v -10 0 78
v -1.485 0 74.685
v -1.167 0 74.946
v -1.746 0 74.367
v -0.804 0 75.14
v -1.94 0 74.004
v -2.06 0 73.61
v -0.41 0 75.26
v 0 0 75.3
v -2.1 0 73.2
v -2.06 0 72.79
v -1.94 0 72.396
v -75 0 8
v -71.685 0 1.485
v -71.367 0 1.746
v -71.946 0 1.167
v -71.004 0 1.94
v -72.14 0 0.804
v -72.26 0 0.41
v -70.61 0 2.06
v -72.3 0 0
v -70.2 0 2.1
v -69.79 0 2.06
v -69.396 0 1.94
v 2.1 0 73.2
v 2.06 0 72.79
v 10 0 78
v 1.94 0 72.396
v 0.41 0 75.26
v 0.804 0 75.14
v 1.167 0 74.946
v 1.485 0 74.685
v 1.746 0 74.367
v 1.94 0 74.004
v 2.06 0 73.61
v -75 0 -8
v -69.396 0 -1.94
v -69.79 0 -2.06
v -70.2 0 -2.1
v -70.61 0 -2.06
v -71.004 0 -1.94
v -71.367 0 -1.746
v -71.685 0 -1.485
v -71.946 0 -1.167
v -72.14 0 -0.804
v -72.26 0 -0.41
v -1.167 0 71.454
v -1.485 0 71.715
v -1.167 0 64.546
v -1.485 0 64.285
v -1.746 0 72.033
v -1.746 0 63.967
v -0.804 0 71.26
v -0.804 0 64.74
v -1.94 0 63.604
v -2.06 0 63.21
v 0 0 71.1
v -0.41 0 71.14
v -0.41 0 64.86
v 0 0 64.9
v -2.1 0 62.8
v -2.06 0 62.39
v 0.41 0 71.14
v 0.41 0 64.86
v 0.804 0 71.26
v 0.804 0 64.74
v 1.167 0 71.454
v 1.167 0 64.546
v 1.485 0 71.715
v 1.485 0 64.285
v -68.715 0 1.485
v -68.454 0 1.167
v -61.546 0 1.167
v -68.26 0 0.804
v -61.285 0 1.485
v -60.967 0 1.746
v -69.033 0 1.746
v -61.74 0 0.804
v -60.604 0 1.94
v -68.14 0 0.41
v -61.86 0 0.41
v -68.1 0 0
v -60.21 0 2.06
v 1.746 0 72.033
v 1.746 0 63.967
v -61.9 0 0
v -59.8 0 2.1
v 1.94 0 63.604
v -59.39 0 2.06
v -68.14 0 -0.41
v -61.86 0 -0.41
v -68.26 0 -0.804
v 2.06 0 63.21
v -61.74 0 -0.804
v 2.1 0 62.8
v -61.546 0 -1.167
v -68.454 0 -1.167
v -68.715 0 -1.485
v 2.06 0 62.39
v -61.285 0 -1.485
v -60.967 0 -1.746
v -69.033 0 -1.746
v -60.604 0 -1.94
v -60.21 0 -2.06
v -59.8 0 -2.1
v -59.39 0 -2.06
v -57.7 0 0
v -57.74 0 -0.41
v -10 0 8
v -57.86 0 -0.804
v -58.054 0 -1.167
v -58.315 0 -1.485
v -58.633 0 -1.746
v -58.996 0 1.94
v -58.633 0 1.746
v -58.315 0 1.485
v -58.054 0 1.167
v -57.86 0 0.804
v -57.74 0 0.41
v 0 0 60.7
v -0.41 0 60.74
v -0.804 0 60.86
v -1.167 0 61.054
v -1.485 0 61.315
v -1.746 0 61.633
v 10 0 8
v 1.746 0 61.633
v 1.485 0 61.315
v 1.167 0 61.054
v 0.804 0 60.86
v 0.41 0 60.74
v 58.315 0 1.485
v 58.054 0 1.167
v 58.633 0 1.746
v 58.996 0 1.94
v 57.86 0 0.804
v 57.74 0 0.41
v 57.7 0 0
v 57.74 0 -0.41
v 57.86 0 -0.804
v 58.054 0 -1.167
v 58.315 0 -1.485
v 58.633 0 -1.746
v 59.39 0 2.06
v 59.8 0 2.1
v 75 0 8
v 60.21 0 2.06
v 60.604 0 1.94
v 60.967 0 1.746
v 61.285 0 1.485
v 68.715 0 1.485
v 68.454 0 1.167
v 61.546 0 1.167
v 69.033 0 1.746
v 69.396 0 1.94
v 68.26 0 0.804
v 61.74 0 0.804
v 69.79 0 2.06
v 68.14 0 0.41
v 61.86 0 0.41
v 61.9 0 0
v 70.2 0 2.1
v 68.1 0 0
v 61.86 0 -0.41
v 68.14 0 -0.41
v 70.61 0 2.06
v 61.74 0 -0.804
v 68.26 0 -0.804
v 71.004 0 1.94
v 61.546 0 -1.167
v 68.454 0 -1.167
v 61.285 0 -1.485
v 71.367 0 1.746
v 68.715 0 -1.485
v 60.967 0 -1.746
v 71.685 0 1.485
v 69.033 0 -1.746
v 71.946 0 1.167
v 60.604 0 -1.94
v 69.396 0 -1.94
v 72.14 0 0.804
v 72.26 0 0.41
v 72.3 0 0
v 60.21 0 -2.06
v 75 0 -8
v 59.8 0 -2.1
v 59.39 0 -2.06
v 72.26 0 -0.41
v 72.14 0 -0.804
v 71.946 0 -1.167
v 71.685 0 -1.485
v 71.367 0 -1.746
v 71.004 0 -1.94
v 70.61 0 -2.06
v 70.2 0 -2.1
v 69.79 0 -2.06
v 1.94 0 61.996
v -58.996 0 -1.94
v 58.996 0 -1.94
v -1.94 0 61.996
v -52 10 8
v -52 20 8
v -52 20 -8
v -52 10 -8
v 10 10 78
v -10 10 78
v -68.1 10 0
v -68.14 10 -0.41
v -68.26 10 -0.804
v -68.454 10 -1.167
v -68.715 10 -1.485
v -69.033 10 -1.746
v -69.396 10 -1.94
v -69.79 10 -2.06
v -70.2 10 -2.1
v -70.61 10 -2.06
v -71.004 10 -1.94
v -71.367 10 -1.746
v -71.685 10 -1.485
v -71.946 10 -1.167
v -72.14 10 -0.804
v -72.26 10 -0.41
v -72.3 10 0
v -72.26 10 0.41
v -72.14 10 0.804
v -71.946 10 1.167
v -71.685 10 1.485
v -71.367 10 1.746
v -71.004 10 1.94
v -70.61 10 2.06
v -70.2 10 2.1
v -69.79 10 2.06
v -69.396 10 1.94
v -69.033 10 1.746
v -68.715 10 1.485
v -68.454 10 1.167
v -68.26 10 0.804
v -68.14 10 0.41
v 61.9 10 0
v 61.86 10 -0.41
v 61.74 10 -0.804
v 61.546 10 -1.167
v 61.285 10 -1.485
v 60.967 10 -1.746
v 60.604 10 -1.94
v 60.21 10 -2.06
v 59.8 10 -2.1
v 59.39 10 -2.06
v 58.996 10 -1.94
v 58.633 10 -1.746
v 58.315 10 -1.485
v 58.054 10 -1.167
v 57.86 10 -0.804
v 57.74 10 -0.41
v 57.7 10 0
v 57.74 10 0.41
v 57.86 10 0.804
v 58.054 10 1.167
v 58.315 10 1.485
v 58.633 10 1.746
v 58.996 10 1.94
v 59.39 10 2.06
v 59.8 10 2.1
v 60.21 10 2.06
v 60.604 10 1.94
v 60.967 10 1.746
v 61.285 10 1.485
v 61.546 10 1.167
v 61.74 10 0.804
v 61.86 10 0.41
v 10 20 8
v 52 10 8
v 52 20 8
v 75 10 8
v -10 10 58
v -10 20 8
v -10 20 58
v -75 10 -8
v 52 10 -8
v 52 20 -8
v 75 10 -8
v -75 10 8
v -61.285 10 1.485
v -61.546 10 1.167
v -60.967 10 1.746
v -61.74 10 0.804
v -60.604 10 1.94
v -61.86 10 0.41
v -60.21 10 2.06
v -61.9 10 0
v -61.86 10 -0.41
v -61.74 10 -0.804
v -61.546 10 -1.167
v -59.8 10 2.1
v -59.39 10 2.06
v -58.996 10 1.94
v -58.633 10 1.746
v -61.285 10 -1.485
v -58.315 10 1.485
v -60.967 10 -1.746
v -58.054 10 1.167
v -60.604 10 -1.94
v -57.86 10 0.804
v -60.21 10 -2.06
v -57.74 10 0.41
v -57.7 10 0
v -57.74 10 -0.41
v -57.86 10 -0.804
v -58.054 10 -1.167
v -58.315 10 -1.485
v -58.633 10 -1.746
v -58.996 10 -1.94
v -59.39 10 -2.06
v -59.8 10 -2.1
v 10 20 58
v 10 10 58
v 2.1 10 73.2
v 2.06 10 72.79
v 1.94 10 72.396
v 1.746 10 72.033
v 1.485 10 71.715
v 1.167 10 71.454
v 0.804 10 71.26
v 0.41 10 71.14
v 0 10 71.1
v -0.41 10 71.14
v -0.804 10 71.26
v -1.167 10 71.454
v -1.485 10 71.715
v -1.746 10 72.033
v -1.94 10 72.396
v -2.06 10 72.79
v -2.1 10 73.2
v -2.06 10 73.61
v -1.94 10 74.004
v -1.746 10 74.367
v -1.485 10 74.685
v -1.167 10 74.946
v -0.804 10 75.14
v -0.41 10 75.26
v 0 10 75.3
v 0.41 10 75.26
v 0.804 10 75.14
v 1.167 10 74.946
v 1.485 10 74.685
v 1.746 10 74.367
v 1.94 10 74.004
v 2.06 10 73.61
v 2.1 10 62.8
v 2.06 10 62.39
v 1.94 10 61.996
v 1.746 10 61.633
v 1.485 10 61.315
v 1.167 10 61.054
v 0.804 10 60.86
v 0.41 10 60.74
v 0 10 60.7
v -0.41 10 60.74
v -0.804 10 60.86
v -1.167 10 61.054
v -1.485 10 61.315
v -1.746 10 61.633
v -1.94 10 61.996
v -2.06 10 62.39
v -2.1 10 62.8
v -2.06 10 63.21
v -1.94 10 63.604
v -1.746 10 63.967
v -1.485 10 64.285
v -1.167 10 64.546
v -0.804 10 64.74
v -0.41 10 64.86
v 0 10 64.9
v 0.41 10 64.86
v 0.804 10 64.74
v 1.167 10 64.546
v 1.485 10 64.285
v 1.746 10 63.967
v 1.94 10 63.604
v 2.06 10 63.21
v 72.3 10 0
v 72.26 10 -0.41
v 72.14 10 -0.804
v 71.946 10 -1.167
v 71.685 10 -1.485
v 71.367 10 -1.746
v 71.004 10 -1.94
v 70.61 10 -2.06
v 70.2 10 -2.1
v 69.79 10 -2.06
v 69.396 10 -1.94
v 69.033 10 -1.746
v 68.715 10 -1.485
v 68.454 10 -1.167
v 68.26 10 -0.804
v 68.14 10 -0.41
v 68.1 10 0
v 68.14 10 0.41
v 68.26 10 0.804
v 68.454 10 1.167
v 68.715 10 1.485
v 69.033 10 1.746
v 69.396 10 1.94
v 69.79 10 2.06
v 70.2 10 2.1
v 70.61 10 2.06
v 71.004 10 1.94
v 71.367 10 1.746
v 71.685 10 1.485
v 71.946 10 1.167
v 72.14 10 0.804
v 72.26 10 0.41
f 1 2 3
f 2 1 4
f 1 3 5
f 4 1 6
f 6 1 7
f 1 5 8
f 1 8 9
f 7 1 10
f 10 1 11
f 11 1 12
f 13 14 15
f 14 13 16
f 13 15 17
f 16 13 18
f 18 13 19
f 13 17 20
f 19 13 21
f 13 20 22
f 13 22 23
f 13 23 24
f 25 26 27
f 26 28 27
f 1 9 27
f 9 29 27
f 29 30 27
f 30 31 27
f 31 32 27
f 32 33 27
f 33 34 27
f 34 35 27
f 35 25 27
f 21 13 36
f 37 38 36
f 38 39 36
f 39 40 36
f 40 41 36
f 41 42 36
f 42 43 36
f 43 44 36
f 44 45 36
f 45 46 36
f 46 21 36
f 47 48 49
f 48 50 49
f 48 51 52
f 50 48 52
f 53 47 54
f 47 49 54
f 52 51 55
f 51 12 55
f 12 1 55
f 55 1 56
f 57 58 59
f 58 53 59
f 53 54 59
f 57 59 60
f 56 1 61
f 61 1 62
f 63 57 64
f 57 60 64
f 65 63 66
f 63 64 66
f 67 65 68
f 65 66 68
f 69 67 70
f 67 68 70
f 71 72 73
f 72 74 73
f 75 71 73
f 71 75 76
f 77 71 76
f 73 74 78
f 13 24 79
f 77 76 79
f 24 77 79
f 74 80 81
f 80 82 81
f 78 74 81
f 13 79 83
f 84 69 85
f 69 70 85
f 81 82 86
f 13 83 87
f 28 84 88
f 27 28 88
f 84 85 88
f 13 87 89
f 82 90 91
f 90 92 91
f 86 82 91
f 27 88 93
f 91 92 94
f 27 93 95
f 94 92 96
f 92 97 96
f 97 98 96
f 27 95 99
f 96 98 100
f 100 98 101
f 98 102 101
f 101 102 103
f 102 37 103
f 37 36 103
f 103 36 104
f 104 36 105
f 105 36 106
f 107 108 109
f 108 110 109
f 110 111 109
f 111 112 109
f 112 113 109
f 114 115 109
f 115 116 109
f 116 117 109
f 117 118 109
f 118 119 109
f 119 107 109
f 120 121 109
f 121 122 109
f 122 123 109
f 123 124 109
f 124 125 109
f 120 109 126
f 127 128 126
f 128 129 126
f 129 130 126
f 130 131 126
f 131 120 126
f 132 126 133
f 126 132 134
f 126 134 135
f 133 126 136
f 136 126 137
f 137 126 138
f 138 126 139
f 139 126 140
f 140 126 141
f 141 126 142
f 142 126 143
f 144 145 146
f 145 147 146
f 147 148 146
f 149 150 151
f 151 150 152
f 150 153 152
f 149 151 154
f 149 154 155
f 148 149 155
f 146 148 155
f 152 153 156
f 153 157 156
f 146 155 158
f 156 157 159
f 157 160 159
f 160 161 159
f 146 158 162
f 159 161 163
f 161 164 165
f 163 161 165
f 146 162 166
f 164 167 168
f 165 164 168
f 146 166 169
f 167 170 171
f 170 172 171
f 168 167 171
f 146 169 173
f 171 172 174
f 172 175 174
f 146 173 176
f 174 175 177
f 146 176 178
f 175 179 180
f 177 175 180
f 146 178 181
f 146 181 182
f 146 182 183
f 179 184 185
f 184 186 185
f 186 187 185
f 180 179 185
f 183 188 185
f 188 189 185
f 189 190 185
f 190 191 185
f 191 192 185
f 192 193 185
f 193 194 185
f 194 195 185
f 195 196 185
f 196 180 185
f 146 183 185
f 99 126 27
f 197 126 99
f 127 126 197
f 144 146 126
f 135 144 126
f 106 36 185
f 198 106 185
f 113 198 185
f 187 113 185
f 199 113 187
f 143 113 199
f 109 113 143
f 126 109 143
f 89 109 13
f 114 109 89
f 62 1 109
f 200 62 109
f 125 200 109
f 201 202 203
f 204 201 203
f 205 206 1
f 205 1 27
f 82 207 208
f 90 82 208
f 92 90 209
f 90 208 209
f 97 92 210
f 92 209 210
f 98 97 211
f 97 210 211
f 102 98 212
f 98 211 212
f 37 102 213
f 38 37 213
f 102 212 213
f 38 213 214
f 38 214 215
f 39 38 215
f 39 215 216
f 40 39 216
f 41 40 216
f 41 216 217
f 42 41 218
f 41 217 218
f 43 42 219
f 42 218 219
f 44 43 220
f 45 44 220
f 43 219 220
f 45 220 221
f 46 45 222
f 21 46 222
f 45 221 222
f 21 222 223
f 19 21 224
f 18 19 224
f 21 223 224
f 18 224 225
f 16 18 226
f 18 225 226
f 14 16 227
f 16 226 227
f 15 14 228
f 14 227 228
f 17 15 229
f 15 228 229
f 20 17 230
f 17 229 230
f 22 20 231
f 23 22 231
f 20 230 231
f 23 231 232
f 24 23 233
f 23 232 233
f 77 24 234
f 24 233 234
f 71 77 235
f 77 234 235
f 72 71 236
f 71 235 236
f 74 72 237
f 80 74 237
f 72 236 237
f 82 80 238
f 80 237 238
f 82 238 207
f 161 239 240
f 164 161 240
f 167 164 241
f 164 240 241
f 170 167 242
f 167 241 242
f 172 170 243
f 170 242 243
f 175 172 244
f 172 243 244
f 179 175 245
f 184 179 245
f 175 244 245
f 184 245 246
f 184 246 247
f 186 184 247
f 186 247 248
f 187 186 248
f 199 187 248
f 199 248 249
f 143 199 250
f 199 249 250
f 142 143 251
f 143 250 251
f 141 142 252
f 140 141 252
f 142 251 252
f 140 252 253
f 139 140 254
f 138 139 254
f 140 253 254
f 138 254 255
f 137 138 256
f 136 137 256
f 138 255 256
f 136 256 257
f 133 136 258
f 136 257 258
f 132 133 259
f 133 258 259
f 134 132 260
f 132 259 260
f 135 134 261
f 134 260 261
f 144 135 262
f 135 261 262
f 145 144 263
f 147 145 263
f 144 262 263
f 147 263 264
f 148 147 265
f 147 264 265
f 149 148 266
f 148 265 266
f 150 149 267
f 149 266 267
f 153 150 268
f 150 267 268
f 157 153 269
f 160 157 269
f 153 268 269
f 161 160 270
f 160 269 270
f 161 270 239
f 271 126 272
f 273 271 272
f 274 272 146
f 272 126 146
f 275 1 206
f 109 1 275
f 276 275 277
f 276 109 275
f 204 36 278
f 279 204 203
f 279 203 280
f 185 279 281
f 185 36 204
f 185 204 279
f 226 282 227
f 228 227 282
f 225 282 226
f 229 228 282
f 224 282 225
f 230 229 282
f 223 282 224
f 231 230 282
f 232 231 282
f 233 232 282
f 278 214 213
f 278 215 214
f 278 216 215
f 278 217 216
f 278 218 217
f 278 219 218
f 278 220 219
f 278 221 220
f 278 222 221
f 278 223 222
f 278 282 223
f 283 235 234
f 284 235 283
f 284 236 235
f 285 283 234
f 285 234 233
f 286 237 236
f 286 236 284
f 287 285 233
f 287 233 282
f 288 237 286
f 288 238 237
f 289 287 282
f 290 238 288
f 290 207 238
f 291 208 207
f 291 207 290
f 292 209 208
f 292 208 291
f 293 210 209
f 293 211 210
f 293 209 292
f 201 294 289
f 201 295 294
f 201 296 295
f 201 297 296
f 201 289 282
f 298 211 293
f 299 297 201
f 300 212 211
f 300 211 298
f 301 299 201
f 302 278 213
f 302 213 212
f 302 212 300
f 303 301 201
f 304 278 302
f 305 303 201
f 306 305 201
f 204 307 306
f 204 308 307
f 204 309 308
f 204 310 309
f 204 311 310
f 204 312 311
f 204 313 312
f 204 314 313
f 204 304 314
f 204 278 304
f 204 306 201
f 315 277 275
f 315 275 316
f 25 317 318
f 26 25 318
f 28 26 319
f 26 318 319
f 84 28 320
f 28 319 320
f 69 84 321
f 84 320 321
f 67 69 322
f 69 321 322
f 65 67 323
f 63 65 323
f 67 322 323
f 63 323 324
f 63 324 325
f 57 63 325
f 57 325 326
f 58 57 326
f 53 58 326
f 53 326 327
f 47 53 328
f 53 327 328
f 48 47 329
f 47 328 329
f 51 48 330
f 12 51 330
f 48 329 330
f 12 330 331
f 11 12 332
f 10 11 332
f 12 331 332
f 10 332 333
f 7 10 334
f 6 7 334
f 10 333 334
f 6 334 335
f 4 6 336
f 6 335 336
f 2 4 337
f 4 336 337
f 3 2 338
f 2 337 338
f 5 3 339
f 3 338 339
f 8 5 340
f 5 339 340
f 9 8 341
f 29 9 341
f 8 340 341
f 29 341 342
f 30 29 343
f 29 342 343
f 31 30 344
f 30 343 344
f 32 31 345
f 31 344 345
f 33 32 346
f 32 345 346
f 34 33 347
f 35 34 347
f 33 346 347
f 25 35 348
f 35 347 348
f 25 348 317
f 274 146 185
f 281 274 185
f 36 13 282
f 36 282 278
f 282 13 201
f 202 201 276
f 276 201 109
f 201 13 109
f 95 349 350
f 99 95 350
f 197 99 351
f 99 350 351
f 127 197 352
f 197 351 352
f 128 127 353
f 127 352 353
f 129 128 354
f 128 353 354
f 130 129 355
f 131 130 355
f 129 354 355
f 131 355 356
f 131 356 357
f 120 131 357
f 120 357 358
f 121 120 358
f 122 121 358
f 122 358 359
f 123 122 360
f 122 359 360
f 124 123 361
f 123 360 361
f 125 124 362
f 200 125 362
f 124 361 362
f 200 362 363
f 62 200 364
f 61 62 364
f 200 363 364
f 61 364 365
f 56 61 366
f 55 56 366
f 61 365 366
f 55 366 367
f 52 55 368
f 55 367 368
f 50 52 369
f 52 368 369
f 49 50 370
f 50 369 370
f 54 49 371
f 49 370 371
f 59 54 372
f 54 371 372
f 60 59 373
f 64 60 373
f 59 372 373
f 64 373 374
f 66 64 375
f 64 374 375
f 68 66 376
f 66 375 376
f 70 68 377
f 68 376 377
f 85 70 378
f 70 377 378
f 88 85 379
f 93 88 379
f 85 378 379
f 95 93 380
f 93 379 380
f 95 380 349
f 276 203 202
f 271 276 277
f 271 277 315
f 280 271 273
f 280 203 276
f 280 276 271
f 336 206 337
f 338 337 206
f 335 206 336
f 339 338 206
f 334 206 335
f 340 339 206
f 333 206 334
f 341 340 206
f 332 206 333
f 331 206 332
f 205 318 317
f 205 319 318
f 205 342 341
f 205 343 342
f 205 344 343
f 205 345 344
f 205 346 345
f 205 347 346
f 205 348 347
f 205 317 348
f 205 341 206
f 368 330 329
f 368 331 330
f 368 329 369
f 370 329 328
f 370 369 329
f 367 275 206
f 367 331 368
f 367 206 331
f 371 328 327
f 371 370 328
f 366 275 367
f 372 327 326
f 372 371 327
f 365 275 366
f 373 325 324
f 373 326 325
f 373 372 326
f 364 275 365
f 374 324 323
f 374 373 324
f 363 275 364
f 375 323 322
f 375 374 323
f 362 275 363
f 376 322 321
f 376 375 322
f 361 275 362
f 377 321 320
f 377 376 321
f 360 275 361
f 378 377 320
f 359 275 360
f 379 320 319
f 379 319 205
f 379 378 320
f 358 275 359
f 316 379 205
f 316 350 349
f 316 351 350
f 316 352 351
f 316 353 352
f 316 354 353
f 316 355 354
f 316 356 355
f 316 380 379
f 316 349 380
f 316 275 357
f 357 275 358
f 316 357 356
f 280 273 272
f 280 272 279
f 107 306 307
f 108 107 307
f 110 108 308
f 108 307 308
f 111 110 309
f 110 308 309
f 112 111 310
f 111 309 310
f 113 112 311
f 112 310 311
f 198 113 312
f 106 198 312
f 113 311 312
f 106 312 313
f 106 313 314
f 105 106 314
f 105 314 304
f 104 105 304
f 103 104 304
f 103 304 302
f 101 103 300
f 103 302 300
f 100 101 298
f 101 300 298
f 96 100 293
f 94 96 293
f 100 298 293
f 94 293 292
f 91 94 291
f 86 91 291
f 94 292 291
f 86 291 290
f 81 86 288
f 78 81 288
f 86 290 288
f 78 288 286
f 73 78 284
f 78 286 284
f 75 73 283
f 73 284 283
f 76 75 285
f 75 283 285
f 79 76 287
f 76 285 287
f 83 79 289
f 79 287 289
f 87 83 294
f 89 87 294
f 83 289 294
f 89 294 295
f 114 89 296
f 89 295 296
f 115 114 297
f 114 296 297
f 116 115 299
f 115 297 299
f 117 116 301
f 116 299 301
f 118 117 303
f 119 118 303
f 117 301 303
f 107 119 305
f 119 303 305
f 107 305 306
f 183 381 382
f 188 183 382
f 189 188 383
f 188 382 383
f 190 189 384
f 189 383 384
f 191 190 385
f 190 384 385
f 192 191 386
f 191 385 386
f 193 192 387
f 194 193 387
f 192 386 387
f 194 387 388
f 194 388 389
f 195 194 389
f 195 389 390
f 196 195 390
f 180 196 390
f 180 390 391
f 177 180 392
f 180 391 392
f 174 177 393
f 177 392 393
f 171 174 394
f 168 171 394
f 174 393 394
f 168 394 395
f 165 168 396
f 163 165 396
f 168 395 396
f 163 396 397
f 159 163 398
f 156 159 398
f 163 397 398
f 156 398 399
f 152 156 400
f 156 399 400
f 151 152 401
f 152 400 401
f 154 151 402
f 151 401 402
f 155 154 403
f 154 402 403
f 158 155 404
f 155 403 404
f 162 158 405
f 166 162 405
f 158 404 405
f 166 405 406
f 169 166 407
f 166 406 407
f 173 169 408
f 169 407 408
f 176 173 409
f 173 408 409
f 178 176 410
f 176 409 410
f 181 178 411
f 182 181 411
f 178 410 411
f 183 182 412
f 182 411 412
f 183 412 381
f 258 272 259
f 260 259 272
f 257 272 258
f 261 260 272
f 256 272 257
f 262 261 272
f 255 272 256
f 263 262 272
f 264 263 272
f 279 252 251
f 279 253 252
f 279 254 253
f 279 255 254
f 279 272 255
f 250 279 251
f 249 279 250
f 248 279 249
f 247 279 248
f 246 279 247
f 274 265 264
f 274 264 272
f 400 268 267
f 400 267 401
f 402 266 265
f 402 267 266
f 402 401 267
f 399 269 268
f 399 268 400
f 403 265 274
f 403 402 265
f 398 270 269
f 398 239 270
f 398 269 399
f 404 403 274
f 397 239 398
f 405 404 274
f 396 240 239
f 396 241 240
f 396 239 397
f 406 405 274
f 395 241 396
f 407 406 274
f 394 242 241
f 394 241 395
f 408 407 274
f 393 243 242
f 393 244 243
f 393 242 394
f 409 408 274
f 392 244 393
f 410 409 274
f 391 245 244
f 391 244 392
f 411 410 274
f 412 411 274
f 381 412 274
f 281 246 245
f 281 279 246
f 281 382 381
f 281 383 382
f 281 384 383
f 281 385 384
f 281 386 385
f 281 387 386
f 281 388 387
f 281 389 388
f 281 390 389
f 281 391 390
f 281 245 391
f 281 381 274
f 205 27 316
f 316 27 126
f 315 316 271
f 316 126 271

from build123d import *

# Parameters (mm, degrees)
SKETCH_1_W          = 150
SKETCH_1_H          = 16
EXTRUDE_1_DEPTH     = 10
SKETCH_2_W          = 110
SKETCH_2_H          = 16
EXTRUDE_2_DEPTH     = 10
SKETCH_4_R          = 2.1
CUT_EXTRUDE_1_DEPTH = 10
SKETCH_5_R          = 2.1
CUT_EXTRUDE_2_DEPTH = 10
SKETCH_6_W          = 20
SKETCH_6_H          = 20
EXTRUDE_3_DEPTH     = 50
SKETCH_7_W          = 20
SKETCH_7_H          = 10
EXTRUDE_4_DEPTH     = 20
SKETCH_8_R          = 2.1
CUT_EXTRUDE_3_DEPTH = 10
SKETCH_9_W          = 3
SKETCH_9_H          = 16
CUT_EXTRUDE_4_DEPTH = 10


with BuildPart() as part:
    # 草图1 → 凸台-拉伸1 (new body)
    with BuildSketch(Plane(origin=(0, 0, 0), x_dir=(1, 0, 0), z_dir=(0, 1, 0))):
        Rectangle(SKETCH_1_W, SKETCH_1_H)
    extrude(amount=EXTRUDE_1_DEPTH)

    # 草图2 → 凸台-拉伸2 (add)
    with BuildSketch(Plane(origin=(0, 10, 0), x_dir=(1, 0, 0), z_dir=(0, 1, 0))):
        Rectangle(SKETCH_2_W, SKETCH_2_H)
    extrude(amount=EXTRUDE_2_DEPTH)

    # 草图4 → 切除-拉伸1 (cut)
    with BuildSketch(Plane(origin=(0, 10, 0), x_dir=(1, 0, 0), z_dir=(0, 1, 0))):
        with Locations((-70.2, 0)):
            Circle(SKETCH_4_R)
        with Locations((-59.8, 0)):
            Circle(SKETCH_4_R)
    extrude(amount=-CUT_EXTRUDE_1_DEPTH, mode=Mode.SUBTRACT)

    # 草图5 → 切除-拉伸2 (cut)
    with BuildSketch(Plane(origin=(0, 10, 0), x_dir=(1, 0, 0), z_dir=(0, 1, 0))):
        with Locations((59.8, 0)):
            Circle(SKETCH_5_R)
        with Locations((70.2, 0)):
            Circle(SKETCH_5_R)
    extrude(amount=-CUT_EXTRUDE_2_DEPTH, mode=Mode.SUBTRACT)

    # 草图6 → 凸台-拉伸3 (add)
    with BuildSketch(Plane.XY.offset(8)):
        with Locations((0, 10)):
            Rectangle(SKETCH_6_W, SKETCH_6_H)
    extrude(amount=EXTRUDE_3_DEPTH)

    # 草图7 → 凸台-拉伸4 (add)
    with BuildSketch(Plane.XY.offset(58)):
        with Locations((0, 5)):
            Rectangle(SKETCH_7_W, SKETCH_7_H)
    extrude(amount=EXTRUDE_4_DEPTH)

    # 草图8 → 切除-拉伸3 (cut)
    with BuildSketch(Plane(origin=(0, 10, 0), x_dir=(1, 0, 0), z_dir=(0, 1, 0))):
        with Locations((0, -62.8)):
            Circle(SKETCH_8_R)
        with Locations((0, -73.2)):
            Circle(SKETCH_8_R)
    extrude(amount=-CUT_EXTRUDE_3_DEPTH, mode=Mode.SUBTRACT)

    # 草图9 → 切除-拉伸4 (cut)
    with BuildSketch(Plane(origin=(0, 20, 0), x_dir=(1, 0, 0), z_dir=(0, 1, 0))):
        with Locations((-53.5, 0)):
            Rectangle(SKETCH_9_W, SKETCH_9_H)
        with Locations((53.5, 0)):
            Rectangle(SKETCH_9_W, SKETCH_9_H)
    extrude(amount=-CUT_EXTRUDE_4_DEPTH, mode=Mode.SUBTRACT)


solid = part.part
